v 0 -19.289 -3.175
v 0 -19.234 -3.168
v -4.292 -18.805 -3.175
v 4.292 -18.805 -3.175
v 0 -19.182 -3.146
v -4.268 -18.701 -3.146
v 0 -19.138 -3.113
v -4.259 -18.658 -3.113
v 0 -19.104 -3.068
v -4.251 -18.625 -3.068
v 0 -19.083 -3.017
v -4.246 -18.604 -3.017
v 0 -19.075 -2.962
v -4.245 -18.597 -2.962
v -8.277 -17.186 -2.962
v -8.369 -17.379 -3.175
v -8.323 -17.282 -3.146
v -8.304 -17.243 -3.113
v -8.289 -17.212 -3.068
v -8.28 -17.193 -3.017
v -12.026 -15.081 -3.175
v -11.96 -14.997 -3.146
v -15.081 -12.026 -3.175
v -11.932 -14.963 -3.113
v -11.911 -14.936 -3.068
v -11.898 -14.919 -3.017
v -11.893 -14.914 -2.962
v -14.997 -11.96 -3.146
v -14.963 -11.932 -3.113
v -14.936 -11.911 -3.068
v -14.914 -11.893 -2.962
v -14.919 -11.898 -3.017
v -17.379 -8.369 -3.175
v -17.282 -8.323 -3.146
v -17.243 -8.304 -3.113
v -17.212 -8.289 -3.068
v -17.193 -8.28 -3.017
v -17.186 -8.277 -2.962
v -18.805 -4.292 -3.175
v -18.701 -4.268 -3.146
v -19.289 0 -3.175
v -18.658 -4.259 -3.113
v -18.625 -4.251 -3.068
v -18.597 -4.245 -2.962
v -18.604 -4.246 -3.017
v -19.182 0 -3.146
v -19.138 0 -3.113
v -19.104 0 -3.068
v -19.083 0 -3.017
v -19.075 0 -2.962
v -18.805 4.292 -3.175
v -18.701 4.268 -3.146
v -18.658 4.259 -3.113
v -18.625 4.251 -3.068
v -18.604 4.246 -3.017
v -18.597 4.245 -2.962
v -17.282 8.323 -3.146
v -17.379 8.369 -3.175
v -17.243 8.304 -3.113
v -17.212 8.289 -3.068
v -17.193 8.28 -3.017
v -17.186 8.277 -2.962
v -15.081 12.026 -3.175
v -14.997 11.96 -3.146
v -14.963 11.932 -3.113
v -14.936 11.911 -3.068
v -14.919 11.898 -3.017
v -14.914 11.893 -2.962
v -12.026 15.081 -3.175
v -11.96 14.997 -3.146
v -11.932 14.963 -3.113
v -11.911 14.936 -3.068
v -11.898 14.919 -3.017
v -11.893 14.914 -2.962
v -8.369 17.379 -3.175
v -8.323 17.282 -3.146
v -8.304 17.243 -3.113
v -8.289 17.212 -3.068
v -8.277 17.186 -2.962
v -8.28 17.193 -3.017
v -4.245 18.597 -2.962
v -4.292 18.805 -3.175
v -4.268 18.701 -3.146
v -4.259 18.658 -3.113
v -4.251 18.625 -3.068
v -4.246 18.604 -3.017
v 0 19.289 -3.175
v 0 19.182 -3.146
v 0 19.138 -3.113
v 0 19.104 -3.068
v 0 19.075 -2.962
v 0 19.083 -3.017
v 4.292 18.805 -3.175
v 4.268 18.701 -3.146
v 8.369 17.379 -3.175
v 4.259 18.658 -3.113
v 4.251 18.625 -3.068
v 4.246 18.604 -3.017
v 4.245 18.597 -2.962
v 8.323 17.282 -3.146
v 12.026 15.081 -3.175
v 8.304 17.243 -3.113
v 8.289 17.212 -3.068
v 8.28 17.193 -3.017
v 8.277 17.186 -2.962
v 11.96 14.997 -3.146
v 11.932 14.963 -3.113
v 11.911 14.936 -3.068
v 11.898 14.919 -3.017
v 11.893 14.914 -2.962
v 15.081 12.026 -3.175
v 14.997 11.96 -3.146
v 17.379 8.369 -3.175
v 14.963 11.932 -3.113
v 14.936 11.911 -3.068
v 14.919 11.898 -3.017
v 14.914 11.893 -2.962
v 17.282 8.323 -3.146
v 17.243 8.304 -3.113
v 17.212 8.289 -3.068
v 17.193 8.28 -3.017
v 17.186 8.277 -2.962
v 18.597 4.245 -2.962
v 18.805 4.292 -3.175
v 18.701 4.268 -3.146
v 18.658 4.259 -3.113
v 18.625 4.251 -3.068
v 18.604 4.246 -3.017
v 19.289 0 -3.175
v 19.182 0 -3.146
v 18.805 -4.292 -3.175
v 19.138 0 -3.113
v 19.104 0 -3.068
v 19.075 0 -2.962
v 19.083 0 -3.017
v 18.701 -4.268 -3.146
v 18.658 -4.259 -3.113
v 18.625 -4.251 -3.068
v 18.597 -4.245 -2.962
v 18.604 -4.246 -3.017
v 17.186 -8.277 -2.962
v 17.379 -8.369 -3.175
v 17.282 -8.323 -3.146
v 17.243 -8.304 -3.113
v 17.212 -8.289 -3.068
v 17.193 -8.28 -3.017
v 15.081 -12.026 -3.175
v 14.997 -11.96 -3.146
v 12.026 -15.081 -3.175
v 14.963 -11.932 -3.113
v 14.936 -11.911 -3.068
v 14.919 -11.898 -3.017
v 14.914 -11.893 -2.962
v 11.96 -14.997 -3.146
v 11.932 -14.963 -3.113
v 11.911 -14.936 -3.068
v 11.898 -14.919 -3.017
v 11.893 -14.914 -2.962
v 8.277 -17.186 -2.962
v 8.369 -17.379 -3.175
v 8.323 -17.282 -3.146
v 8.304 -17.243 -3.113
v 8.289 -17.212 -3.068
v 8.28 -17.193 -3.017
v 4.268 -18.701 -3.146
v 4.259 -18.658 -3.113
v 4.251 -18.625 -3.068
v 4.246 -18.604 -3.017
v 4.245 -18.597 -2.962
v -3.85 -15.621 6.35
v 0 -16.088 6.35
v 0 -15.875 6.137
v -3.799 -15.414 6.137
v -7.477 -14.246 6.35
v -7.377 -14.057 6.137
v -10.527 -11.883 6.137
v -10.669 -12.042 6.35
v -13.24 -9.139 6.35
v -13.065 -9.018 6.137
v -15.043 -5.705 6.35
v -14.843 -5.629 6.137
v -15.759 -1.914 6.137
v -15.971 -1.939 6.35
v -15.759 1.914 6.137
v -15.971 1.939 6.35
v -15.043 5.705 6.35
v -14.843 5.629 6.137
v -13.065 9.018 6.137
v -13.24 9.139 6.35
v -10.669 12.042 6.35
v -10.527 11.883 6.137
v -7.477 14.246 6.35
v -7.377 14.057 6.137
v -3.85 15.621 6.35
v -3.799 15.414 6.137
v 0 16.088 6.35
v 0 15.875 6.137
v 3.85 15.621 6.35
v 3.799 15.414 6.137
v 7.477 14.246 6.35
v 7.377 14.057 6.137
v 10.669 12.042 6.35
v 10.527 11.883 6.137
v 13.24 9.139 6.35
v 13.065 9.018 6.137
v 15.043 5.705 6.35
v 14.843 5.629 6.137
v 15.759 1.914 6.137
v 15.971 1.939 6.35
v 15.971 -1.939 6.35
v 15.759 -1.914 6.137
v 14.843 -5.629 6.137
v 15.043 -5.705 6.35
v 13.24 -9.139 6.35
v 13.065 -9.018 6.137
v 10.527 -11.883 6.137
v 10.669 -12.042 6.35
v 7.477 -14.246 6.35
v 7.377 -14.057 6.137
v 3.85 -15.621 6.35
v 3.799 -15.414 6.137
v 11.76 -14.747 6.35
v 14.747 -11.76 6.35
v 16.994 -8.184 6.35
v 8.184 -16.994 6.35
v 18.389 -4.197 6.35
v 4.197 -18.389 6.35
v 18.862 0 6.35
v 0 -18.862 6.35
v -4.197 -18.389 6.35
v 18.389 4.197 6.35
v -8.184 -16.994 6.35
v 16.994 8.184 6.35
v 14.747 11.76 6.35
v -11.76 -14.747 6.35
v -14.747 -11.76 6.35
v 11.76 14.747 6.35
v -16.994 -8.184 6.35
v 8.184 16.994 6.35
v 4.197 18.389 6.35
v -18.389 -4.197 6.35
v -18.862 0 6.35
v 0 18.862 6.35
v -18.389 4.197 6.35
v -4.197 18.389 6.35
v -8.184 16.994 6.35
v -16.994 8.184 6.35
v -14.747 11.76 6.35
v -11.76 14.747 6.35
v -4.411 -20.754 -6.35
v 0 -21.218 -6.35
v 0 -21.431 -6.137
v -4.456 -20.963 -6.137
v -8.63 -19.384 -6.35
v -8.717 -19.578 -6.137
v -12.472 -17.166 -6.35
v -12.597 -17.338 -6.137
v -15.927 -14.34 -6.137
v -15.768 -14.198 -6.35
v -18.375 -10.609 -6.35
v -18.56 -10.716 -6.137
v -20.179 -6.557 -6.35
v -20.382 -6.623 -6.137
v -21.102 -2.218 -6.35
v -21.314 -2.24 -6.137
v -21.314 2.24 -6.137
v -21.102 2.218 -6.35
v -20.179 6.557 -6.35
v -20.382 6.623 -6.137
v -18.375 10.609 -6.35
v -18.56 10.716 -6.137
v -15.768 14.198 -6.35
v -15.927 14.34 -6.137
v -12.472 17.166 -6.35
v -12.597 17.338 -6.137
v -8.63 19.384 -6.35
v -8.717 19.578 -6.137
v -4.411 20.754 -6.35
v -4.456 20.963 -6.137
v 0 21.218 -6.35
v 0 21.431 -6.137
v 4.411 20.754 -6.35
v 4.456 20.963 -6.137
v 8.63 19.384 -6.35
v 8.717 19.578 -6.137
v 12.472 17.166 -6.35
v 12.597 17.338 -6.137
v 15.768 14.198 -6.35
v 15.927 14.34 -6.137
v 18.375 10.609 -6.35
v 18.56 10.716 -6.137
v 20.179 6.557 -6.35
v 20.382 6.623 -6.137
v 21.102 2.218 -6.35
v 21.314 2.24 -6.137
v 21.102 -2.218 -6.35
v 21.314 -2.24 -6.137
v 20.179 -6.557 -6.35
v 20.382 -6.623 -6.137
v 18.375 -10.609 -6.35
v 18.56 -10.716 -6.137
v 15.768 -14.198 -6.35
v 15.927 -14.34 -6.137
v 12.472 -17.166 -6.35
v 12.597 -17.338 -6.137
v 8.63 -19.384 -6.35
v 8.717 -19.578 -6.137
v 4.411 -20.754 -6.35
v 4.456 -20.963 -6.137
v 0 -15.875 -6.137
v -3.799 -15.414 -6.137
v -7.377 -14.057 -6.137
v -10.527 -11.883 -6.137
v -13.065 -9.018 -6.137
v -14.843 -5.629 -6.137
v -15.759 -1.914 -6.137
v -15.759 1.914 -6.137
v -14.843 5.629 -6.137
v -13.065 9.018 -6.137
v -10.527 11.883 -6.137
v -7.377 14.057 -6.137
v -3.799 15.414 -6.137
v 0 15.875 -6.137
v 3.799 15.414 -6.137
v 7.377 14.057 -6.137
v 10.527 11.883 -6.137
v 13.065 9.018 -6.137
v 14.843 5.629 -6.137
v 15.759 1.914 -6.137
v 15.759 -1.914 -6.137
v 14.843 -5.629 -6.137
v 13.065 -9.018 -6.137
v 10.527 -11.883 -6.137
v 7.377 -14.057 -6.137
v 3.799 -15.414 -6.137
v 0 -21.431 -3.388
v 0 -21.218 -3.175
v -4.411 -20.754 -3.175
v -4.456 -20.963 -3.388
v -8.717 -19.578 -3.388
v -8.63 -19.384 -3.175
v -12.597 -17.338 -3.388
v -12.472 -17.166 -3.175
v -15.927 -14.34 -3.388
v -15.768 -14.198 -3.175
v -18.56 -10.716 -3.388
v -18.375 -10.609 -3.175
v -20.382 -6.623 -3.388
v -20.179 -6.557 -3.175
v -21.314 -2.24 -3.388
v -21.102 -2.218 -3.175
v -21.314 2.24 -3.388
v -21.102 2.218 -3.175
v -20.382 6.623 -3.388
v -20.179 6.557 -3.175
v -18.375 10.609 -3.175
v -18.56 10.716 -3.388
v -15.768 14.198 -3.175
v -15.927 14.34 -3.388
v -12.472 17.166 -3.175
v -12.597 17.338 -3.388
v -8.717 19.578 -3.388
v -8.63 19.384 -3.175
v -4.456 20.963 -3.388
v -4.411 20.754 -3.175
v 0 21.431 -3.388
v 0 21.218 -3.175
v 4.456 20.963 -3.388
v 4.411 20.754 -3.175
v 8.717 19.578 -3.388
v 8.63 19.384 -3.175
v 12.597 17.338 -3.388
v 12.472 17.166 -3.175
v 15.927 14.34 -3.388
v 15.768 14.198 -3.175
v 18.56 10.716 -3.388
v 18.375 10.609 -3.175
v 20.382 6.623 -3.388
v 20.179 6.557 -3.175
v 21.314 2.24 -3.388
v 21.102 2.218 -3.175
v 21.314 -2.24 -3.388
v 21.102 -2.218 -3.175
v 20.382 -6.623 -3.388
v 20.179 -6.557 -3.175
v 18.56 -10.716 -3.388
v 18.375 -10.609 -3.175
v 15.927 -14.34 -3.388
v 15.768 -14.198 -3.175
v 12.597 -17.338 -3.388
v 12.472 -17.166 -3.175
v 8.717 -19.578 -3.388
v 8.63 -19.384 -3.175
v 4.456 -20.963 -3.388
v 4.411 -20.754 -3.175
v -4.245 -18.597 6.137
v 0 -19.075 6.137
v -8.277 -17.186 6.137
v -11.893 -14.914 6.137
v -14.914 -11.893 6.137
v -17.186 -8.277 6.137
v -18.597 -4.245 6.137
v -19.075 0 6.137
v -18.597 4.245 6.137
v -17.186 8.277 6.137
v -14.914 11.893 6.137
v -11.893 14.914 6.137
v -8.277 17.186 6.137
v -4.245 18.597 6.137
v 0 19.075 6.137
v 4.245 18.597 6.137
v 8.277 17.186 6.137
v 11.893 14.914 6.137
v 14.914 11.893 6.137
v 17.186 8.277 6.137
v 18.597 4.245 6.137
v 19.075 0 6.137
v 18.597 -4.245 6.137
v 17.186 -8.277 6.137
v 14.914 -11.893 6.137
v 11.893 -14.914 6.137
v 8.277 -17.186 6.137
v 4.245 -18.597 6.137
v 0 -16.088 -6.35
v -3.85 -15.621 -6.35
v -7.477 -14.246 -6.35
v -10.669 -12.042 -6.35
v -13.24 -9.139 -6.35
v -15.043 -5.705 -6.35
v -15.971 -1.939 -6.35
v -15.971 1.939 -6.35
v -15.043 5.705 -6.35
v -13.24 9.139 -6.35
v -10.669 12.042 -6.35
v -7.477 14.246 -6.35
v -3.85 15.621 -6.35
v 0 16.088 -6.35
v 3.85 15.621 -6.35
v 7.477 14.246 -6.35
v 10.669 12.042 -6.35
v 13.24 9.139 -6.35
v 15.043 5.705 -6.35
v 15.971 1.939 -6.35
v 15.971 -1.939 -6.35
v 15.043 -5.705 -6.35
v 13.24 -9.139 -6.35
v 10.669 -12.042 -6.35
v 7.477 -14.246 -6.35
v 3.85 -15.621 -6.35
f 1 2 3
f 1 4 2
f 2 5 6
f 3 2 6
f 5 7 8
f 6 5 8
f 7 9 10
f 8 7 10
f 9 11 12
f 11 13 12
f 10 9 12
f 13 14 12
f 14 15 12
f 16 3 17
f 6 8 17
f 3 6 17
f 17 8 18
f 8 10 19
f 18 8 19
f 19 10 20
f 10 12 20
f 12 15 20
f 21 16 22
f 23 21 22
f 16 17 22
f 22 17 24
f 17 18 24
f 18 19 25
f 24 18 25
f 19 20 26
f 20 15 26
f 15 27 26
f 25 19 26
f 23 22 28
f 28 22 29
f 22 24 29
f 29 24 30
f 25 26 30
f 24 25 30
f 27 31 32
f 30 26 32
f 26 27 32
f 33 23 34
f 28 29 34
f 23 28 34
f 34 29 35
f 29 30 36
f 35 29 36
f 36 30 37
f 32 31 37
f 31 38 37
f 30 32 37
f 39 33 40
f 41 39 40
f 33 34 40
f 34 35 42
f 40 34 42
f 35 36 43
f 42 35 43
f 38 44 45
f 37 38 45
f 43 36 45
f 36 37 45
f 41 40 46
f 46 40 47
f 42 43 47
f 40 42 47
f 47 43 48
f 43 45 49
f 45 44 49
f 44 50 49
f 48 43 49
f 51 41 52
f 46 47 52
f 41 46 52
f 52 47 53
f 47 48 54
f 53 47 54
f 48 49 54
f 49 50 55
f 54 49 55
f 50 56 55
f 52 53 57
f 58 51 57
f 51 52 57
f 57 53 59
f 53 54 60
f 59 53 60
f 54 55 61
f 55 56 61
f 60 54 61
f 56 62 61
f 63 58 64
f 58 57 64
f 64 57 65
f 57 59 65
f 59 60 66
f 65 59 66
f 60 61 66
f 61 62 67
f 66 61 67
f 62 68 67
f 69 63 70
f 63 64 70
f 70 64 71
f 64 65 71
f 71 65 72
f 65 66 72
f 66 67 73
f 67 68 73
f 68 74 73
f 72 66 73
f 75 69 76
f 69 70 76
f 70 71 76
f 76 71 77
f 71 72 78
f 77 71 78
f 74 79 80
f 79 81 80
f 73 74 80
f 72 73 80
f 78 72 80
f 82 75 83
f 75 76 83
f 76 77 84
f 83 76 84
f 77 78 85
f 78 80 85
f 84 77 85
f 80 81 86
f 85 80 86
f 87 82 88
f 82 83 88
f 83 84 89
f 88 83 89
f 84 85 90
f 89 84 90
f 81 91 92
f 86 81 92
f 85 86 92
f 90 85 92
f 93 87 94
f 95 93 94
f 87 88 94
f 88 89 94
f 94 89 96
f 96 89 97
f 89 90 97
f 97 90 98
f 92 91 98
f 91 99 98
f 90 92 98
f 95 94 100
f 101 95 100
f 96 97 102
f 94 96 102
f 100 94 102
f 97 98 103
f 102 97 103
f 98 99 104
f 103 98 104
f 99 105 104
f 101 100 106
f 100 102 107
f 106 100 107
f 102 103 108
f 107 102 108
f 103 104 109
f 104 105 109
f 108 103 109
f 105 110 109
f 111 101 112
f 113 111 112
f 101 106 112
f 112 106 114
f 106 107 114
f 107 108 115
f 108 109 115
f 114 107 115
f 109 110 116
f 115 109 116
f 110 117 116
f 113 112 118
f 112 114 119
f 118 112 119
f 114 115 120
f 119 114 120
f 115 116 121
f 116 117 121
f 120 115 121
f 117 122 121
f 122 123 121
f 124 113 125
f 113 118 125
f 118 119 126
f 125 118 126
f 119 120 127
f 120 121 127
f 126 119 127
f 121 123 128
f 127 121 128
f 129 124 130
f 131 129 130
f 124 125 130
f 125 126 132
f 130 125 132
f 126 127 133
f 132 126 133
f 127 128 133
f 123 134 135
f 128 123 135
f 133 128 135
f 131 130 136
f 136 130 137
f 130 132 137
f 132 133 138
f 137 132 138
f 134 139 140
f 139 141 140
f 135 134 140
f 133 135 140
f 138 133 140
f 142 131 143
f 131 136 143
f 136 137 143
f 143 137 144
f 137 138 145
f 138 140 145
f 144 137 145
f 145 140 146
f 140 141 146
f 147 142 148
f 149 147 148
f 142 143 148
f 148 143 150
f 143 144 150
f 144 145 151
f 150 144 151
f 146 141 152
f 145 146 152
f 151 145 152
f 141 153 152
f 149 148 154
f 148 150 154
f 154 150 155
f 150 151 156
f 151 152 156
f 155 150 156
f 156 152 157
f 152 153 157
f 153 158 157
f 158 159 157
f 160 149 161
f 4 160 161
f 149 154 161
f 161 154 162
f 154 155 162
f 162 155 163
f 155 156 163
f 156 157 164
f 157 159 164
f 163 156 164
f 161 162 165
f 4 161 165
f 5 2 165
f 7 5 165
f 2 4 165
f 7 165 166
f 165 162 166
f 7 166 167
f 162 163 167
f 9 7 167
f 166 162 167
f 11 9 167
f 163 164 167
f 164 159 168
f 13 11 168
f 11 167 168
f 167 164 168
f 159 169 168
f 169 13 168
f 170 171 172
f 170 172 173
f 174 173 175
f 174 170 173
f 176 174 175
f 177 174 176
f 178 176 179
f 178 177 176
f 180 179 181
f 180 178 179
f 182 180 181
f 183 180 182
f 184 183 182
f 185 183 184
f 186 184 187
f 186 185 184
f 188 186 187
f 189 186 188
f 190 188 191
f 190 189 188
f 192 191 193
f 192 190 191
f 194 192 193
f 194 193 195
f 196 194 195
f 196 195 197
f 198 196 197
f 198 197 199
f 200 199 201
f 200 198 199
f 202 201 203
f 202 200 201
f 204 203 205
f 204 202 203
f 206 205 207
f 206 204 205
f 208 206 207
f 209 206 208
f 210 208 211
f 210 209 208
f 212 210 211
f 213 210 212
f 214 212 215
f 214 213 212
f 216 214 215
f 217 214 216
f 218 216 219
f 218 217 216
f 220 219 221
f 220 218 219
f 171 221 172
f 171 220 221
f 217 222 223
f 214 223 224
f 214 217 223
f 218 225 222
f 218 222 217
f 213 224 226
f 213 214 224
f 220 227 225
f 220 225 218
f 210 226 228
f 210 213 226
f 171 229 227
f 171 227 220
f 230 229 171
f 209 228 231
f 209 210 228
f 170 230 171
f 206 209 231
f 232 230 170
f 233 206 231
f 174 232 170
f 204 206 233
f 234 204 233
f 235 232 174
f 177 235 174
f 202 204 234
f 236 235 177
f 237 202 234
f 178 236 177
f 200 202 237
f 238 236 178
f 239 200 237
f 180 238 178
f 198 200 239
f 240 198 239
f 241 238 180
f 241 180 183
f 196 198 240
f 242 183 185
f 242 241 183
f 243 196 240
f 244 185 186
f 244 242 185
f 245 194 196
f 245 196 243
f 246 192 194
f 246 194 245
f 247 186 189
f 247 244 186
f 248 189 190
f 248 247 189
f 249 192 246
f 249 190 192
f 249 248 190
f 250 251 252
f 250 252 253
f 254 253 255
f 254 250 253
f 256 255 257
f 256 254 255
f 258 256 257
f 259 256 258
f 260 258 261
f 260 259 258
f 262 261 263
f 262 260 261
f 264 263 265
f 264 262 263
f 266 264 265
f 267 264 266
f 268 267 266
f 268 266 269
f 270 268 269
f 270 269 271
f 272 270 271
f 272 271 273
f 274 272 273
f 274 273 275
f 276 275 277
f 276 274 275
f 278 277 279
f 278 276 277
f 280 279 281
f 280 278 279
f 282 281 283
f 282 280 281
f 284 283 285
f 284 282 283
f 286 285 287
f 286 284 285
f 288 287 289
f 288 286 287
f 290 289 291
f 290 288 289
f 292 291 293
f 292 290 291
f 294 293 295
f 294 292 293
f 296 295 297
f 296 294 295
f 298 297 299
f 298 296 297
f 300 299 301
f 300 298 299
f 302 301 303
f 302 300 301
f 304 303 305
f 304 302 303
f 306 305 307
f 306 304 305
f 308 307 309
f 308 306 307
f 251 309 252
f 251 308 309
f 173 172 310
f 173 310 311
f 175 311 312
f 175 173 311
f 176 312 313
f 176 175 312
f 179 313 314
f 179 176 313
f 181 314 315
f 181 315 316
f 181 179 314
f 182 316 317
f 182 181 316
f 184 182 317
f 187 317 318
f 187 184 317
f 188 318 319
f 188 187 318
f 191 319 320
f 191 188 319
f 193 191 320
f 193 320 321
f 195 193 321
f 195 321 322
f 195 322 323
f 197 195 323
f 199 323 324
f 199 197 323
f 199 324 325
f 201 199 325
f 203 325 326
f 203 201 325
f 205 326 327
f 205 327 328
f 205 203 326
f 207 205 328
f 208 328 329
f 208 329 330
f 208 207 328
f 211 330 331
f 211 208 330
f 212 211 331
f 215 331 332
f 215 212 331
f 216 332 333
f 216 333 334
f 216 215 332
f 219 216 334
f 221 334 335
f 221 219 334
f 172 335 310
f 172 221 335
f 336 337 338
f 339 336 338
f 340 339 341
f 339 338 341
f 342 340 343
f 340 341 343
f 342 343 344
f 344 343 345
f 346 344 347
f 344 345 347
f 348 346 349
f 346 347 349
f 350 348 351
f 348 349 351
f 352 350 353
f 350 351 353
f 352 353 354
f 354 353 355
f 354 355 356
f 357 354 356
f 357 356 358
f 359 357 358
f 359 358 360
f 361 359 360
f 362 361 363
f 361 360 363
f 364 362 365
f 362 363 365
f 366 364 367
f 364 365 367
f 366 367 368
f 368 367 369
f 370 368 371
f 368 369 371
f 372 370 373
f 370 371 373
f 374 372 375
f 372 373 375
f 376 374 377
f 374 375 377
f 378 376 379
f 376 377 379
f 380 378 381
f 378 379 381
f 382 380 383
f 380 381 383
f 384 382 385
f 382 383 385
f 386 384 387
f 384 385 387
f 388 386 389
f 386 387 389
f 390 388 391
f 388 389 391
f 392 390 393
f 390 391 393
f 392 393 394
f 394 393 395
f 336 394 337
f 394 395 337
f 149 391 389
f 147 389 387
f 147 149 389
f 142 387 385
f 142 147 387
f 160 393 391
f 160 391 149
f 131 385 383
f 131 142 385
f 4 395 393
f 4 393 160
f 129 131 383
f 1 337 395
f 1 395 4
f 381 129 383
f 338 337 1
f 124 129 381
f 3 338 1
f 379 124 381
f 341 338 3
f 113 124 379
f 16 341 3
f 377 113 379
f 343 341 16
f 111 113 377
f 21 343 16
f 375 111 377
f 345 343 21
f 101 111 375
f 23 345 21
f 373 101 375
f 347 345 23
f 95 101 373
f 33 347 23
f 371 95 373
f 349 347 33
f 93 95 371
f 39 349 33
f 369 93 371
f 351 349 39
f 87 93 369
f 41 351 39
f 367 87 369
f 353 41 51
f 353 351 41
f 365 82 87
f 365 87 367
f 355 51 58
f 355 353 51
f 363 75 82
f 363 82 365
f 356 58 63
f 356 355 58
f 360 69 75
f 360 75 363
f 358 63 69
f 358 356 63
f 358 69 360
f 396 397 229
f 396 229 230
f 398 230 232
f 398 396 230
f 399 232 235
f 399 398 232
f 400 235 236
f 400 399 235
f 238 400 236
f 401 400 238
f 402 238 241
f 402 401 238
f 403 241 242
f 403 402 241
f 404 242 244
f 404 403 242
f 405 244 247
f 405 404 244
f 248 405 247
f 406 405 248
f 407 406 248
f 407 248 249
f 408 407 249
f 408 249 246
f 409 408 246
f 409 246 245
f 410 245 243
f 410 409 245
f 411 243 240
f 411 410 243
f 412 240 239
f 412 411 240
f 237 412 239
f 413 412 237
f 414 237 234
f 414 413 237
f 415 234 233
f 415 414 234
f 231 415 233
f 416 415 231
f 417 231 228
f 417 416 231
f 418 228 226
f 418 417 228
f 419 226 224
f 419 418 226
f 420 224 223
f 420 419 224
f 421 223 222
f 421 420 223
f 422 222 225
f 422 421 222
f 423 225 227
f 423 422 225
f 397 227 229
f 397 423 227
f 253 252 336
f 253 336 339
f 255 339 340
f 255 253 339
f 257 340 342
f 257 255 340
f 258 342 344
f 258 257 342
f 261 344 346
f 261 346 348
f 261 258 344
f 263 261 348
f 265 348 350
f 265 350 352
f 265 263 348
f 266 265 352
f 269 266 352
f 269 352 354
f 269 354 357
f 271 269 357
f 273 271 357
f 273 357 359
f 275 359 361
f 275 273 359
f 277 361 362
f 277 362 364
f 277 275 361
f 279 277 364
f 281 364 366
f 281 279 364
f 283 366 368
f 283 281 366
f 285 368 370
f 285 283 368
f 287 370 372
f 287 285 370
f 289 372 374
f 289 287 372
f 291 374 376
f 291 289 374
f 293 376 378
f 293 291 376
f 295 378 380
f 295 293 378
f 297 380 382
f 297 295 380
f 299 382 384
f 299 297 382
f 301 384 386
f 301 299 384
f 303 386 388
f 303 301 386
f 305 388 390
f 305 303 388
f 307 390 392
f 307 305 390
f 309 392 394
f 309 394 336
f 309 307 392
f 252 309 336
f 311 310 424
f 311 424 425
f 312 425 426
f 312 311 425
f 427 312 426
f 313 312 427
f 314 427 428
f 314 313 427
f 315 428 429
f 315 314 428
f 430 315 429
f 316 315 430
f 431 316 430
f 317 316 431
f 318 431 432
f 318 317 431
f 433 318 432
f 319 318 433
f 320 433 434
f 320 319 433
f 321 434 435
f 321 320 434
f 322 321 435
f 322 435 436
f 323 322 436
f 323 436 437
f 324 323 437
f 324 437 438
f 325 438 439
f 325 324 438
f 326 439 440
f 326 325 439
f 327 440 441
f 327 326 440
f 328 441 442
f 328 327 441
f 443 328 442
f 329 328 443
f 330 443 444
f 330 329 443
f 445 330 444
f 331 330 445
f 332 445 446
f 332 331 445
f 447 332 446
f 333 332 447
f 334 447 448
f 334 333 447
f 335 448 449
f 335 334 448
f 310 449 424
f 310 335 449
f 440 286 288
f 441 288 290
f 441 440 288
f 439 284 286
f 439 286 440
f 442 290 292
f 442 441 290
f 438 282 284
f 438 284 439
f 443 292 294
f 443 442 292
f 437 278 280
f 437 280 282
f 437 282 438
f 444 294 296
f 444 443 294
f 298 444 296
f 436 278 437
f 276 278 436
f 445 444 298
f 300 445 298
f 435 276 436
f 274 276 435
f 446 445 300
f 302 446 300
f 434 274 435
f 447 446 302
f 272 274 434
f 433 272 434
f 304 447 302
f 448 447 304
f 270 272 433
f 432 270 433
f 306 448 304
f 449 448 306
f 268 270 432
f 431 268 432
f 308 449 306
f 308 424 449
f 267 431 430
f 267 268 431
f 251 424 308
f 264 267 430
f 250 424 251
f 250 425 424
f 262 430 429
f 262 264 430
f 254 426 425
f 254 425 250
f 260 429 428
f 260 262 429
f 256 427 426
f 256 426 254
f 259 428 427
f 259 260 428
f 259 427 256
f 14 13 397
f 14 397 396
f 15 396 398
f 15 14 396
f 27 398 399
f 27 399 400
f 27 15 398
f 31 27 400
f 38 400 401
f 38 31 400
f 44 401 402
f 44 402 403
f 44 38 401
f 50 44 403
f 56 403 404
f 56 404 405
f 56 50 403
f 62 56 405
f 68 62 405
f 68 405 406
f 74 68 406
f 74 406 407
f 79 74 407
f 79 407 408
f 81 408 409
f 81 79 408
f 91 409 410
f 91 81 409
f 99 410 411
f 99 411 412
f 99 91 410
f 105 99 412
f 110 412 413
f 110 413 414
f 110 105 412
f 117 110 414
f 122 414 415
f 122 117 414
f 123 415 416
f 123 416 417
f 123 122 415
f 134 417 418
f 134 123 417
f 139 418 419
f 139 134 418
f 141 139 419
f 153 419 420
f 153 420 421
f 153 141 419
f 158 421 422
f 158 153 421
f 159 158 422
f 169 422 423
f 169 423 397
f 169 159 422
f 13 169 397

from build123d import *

# Parameters (mm, degrees)
FILLET1_SIZE = 0.21336
FILLET2_R    = 0.21336


with BuildPart() as part:
    # Sketch4 → Revolve1 (revolve)
    with BuildSketch(Plane(origin=(0, 0, 0), x_dir=(0, 0, -1), z_dir=(1, 0, 0))):
        Polygon((3.175, -21.43125), (6.35, -21.43125), (6.35, -15.875), (-6.35, -15.875), (-6.35, -19.0754), (3.175, -19.0754), align=None)
    revolve(axis=Axis((0, 0, 6.35), (0, 0, -1)))

    # Fillet1
    fillet1_edges = [part.edges().sort_by_distance(p)[0] for p in [
        (0, 19.0754, 6.35),
        (0, 15.875, 6.35),
        (0, 15.875, -6.35),
        (0, 21.43125, -6.35),
        (0, 21.43125, -3.175),
    ]]
    chamfer(fillet1_edges, length=FILLET1_SIZE)

    # Fillet2
    fillet2_edges = [part.edges().sort_by_distance(p)[0] for p in [
        (0, 19.0754, -3.175),
    ]]
    fillet(fillet2_edges, radius=FILLET2_R)


solid = part.part
